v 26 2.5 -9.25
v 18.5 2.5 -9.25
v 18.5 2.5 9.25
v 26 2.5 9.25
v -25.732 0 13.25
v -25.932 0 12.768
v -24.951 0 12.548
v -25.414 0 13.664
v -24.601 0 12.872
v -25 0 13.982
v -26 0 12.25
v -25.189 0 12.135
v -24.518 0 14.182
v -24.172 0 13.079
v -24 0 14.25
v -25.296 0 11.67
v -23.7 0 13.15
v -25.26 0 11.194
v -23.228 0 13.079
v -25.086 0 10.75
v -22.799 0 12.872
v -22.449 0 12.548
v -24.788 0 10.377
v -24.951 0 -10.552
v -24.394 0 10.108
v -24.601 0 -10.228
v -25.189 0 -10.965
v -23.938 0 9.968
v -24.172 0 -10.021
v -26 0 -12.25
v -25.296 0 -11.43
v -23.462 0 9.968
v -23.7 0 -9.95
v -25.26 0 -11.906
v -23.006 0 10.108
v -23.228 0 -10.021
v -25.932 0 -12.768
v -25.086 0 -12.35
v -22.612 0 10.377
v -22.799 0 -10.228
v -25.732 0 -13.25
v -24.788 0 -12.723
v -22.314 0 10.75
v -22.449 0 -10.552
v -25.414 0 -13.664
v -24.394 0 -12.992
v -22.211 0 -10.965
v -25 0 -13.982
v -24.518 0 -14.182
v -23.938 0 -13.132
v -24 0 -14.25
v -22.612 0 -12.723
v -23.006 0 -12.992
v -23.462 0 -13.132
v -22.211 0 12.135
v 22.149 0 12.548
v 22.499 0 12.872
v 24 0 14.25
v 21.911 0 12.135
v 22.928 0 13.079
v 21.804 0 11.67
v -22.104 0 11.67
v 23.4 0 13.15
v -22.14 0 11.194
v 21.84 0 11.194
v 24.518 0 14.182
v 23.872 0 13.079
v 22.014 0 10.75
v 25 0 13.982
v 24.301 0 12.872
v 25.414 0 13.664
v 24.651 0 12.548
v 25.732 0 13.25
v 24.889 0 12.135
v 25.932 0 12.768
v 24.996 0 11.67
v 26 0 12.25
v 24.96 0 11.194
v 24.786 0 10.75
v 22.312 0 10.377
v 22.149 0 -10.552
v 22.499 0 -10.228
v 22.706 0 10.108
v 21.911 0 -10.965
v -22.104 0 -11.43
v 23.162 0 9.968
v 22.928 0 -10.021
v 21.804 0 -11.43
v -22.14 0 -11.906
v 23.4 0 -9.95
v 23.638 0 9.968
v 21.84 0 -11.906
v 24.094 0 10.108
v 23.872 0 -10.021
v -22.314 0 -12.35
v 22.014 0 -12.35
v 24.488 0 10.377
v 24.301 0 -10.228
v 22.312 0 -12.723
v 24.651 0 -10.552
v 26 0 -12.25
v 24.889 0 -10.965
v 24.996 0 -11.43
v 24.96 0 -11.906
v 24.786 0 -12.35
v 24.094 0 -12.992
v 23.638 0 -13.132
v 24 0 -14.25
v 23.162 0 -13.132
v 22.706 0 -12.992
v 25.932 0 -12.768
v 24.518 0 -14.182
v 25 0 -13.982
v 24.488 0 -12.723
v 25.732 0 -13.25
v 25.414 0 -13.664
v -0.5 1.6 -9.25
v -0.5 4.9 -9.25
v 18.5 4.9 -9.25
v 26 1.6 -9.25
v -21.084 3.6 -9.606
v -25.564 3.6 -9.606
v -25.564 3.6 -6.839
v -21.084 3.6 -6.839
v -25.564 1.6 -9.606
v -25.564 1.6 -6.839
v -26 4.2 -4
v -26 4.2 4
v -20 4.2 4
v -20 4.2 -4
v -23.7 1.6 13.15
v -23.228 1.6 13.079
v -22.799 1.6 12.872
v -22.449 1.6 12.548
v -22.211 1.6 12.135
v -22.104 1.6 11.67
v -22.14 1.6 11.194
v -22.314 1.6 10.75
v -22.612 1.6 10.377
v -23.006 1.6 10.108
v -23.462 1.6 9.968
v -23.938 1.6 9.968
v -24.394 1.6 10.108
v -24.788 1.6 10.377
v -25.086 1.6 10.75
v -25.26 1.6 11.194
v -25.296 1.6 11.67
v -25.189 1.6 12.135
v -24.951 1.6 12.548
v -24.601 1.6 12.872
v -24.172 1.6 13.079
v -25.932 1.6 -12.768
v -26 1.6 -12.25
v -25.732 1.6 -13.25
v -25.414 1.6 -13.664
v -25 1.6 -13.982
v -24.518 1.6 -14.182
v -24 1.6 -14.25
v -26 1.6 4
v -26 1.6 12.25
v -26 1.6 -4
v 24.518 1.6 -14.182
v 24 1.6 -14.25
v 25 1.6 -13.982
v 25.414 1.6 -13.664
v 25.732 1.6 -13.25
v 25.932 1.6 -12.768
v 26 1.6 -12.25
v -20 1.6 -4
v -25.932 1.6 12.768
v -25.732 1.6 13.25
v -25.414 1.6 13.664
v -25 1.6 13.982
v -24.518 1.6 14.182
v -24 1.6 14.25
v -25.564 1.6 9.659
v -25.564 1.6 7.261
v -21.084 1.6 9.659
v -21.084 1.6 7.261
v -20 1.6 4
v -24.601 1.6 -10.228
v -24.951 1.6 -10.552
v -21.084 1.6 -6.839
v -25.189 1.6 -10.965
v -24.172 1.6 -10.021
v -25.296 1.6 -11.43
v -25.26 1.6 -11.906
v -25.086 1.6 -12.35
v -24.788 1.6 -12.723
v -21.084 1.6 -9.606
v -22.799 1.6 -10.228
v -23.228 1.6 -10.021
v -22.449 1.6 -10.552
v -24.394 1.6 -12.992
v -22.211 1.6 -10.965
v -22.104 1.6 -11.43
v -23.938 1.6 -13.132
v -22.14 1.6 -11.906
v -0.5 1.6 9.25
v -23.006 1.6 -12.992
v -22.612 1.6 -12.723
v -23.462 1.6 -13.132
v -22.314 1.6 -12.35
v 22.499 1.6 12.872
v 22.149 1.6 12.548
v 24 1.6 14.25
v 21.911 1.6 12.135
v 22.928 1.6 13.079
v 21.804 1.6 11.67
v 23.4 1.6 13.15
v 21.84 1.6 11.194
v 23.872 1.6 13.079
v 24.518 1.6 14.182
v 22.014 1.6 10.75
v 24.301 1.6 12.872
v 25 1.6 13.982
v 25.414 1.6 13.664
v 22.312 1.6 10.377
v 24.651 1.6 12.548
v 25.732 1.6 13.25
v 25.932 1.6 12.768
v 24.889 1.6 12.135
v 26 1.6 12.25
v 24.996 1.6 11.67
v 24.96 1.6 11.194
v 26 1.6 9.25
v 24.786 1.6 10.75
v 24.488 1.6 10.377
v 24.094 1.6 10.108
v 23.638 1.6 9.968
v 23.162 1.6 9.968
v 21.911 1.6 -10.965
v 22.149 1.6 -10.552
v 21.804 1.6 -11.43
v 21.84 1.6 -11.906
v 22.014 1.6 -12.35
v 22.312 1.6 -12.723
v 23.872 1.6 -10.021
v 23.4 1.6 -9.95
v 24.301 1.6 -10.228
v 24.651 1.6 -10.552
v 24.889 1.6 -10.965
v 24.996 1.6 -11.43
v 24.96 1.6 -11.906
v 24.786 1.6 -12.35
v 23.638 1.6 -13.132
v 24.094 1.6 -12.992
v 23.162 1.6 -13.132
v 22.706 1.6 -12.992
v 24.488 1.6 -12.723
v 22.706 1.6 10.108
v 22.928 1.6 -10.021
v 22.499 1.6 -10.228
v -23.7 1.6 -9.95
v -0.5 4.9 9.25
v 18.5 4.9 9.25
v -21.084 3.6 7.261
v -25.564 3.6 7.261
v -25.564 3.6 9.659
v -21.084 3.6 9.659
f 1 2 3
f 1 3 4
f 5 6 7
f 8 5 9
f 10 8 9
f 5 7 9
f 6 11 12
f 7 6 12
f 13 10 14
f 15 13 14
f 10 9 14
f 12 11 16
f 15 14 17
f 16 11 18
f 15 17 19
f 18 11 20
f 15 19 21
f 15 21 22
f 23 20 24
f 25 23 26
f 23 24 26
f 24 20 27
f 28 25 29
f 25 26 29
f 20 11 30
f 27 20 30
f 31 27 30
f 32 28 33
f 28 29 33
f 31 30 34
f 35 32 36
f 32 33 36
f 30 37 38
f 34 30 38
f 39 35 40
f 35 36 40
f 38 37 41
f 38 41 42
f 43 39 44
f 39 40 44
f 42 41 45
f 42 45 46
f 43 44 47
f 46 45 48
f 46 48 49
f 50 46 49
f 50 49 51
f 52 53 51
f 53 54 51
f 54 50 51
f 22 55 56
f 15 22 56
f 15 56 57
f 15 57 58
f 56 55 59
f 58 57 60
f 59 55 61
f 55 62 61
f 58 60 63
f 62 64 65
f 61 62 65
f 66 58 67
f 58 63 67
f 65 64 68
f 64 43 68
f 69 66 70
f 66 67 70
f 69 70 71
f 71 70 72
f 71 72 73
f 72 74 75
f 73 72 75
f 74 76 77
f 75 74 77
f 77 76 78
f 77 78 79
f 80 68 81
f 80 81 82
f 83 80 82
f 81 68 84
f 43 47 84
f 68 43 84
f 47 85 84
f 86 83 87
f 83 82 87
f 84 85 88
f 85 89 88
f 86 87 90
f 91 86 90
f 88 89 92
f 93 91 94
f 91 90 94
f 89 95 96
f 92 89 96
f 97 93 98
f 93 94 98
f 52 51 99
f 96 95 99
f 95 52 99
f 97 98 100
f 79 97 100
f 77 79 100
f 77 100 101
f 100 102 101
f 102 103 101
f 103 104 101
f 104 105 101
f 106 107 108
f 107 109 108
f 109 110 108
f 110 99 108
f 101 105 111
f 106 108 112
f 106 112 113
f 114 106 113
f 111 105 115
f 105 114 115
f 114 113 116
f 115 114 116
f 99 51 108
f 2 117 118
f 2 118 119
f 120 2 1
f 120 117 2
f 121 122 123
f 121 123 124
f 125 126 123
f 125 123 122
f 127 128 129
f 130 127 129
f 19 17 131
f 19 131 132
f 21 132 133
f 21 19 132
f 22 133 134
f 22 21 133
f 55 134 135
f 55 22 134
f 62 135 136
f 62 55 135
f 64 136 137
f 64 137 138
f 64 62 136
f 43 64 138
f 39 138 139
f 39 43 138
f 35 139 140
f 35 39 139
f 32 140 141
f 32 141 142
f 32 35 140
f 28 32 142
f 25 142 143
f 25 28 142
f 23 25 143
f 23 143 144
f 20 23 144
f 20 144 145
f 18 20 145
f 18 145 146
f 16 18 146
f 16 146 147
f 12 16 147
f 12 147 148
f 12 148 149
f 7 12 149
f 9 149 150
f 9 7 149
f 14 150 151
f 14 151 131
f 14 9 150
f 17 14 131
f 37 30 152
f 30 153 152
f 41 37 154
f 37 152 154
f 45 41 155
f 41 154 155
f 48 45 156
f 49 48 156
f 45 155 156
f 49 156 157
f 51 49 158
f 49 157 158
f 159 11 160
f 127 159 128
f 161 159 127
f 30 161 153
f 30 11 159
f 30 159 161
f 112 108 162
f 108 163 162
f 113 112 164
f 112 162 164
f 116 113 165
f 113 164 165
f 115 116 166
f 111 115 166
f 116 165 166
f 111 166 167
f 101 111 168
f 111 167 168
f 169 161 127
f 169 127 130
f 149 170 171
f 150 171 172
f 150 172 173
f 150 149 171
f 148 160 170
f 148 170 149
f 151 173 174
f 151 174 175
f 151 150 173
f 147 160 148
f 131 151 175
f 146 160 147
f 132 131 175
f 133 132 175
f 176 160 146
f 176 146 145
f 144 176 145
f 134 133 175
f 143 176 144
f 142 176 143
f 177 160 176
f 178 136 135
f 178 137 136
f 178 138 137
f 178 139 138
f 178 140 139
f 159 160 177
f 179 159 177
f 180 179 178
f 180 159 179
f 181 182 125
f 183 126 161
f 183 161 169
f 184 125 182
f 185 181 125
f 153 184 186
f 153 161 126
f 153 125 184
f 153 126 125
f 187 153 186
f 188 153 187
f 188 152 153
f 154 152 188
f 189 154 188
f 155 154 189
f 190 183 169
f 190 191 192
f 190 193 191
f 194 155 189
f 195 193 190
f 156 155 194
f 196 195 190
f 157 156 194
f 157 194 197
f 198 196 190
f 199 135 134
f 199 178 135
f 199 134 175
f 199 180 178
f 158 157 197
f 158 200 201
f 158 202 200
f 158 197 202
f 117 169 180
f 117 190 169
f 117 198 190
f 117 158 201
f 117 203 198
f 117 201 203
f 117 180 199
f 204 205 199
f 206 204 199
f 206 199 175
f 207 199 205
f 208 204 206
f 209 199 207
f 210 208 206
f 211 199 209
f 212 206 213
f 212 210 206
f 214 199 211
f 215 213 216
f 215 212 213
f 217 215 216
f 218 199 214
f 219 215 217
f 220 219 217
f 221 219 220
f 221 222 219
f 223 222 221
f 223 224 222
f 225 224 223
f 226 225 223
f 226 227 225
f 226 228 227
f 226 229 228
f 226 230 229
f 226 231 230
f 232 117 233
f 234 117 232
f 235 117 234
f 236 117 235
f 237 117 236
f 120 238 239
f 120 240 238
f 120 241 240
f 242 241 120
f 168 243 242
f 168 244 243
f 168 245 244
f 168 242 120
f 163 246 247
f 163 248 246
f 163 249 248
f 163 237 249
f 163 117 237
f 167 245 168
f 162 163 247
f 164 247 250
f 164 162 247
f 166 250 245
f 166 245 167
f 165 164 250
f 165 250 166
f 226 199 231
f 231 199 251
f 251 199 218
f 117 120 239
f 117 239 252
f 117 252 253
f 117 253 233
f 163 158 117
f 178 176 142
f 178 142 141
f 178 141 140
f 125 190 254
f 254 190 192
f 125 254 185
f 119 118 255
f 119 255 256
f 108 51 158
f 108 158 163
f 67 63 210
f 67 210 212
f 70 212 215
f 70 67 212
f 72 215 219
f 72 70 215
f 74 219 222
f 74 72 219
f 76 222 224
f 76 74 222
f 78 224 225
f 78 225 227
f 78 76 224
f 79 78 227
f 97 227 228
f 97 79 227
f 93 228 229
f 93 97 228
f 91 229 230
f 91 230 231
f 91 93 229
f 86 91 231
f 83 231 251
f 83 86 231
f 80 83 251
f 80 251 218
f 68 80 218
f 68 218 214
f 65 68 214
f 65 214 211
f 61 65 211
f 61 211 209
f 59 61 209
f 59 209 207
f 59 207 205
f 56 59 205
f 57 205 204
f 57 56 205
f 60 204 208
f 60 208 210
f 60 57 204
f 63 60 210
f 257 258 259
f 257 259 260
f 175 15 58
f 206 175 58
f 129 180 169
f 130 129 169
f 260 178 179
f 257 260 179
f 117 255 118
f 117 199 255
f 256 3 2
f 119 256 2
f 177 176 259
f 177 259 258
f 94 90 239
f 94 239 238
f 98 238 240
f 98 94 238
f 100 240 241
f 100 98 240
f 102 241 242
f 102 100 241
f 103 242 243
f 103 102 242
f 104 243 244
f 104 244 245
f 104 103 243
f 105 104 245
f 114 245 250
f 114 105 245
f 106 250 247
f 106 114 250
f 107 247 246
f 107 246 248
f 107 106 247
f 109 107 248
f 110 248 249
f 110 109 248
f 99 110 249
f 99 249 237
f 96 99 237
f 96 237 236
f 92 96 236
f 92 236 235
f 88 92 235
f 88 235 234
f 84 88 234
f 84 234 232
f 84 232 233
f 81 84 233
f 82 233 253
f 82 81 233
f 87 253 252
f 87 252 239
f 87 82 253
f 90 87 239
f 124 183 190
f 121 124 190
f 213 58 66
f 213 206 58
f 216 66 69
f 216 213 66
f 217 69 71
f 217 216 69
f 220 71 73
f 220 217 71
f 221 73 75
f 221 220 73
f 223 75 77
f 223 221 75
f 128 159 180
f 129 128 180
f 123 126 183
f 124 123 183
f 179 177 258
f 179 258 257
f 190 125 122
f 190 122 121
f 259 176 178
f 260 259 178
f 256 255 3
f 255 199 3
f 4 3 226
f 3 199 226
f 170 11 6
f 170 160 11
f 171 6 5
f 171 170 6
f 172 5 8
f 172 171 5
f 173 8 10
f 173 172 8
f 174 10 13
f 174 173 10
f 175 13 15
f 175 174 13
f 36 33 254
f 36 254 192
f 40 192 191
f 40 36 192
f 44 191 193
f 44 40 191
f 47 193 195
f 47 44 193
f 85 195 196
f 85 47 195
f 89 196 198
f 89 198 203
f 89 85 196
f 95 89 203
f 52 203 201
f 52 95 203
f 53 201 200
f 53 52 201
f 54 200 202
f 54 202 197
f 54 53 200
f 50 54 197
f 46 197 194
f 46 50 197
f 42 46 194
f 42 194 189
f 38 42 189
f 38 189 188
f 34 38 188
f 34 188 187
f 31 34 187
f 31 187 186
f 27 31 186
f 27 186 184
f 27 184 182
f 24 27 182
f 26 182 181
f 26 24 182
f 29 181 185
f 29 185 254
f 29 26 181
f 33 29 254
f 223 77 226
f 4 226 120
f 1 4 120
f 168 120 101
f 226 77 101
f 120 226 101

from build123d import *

# Parameters (mm, degrees)
SKETCH1_W           = 52
SKETCH1_H           = 28.5
SKETCH1_R           = 1.6
BOSS_EXTRUDE1_DEPTH = 1.6
FILLET1_R           = 2
SKETCH2_W           = 6
SKETCH2_H           = 8
BOSS_EXTRUDE2_DEPTH = 2.6
SKETCH3_W           = 26.5
SKETCH3_H           = 18.5
BOSS_EXTRUDE3_DEPTH = 0.9
SKETCH4_W           = 19
SKETCH4_H           = 18.5
BOSS_EXTRUDE4_DEPTH = 2.4
SKETCH5_W           = 4.480247742
SKETCH5_H           = 2.767211841
SKETCH5_H_2         = 2.398250262
BOSS_EXTRUDE5_DEPTH = 2


with BuildPart() as part:
    # Sketch1 → Boss-Extrude1 (new body)
    with BuildSketch(Plane(origin=(0, 0, 0), x_dir=(1, 0, 0), z_dir=(0, 1, 0))):
        Rectangle(SKETCH1_W, SKETCH1_H)
        with Locations(Location((-23.7, 11.55, 0), (0, 0, 270))):
            Circle(SKETCH1_R, mode=Mode.SUBTRACT)
        with Locations(Location((-23.7, -11.55, 0), (0, 0, 270))):
            Circle(SKETCH1_R, mode=Mode.SUBTRACT)
        with Locations(Location((23.4, 11.55, 0), (0, 0, 270))):
            Circle(SKETCH1_R, mode=Mode.SUBTRACT)
        with Locations(Location((23.4, -11.55, 0), (0, 0, 270))):
            Circle(SKETCH1_R, mode=Mode.SUBTRACT)
    extrude(amount=BOSS_EXTRUDE1_DEPTH)

    # Fillet1
    fillet1_edges = [part.edges().sort_by_distance(p)[0] for p in [
        (-26, 0.8, -14.25),
        (26, 0.8, -14.25),
        (26, 0.8, 14.25),
        (-26, 0.8, 14.25),
    ]]
    fillet(fillet1_edges, radius=FILLET1_R)

    # Sketch2 → Boss-Extrude2 (add)
    with BuildSketch(Plane(origin=(0, 1.6, 0), x_dir=(1, 0, 0), z_dir=(0, 1, 0))):
        with Locations((-23, 0)):
            Rectangle(SKETCH2_W, SKETCH2_H)
    extrude(amount=BOSS_EXTRUDE2_DEPTH)

    # Sketch3 → Boss-Extrude3 (add)
    with BuildSketch(Plane(origin=(0, 1.6, 0), x_dir=(1, 0, 0), z_dir=(0, 1, 0))):
        with Locations((12.75, 0)):
            Rectangle(SKETCH3_W, SKETCH3_H)
    extrude(amount=BOSS_EXTRUDE3_DEPTH)

    # Sketch4 → Boss-Extrude4 (add)
    with BuildSketch(Plane(origin=(0, 2.5, 0), x_dir=(1, 0, 0), z_dir=(0, 1, 0))):
        with Locations((9, 0)):
            Rectangle(SKETCH4_W, SKETCH4_H)
    extrude(amount=BOSS_EXTRUDE4_DEPTH)

    # Sketch5 → Boss-Extrude5 (add)
    with BuildSketch(Plane(origin=(0, 1.6, 0), x_dir=(1, 0, 0), z_dir=(0, 1, 0))):
        with Locations((-23.323642657, 8.222572326)):
            Rectangle(SKETCH5_W, SKETCH5_H)
        with Locations((-23.323642657, -8.459761913)):
            Rectangle(SKETCH5_W, SKETCH5_H_2)
    extrude(amount=BOSS_EXTRUDE5_DEPTH)


solid = part.part
